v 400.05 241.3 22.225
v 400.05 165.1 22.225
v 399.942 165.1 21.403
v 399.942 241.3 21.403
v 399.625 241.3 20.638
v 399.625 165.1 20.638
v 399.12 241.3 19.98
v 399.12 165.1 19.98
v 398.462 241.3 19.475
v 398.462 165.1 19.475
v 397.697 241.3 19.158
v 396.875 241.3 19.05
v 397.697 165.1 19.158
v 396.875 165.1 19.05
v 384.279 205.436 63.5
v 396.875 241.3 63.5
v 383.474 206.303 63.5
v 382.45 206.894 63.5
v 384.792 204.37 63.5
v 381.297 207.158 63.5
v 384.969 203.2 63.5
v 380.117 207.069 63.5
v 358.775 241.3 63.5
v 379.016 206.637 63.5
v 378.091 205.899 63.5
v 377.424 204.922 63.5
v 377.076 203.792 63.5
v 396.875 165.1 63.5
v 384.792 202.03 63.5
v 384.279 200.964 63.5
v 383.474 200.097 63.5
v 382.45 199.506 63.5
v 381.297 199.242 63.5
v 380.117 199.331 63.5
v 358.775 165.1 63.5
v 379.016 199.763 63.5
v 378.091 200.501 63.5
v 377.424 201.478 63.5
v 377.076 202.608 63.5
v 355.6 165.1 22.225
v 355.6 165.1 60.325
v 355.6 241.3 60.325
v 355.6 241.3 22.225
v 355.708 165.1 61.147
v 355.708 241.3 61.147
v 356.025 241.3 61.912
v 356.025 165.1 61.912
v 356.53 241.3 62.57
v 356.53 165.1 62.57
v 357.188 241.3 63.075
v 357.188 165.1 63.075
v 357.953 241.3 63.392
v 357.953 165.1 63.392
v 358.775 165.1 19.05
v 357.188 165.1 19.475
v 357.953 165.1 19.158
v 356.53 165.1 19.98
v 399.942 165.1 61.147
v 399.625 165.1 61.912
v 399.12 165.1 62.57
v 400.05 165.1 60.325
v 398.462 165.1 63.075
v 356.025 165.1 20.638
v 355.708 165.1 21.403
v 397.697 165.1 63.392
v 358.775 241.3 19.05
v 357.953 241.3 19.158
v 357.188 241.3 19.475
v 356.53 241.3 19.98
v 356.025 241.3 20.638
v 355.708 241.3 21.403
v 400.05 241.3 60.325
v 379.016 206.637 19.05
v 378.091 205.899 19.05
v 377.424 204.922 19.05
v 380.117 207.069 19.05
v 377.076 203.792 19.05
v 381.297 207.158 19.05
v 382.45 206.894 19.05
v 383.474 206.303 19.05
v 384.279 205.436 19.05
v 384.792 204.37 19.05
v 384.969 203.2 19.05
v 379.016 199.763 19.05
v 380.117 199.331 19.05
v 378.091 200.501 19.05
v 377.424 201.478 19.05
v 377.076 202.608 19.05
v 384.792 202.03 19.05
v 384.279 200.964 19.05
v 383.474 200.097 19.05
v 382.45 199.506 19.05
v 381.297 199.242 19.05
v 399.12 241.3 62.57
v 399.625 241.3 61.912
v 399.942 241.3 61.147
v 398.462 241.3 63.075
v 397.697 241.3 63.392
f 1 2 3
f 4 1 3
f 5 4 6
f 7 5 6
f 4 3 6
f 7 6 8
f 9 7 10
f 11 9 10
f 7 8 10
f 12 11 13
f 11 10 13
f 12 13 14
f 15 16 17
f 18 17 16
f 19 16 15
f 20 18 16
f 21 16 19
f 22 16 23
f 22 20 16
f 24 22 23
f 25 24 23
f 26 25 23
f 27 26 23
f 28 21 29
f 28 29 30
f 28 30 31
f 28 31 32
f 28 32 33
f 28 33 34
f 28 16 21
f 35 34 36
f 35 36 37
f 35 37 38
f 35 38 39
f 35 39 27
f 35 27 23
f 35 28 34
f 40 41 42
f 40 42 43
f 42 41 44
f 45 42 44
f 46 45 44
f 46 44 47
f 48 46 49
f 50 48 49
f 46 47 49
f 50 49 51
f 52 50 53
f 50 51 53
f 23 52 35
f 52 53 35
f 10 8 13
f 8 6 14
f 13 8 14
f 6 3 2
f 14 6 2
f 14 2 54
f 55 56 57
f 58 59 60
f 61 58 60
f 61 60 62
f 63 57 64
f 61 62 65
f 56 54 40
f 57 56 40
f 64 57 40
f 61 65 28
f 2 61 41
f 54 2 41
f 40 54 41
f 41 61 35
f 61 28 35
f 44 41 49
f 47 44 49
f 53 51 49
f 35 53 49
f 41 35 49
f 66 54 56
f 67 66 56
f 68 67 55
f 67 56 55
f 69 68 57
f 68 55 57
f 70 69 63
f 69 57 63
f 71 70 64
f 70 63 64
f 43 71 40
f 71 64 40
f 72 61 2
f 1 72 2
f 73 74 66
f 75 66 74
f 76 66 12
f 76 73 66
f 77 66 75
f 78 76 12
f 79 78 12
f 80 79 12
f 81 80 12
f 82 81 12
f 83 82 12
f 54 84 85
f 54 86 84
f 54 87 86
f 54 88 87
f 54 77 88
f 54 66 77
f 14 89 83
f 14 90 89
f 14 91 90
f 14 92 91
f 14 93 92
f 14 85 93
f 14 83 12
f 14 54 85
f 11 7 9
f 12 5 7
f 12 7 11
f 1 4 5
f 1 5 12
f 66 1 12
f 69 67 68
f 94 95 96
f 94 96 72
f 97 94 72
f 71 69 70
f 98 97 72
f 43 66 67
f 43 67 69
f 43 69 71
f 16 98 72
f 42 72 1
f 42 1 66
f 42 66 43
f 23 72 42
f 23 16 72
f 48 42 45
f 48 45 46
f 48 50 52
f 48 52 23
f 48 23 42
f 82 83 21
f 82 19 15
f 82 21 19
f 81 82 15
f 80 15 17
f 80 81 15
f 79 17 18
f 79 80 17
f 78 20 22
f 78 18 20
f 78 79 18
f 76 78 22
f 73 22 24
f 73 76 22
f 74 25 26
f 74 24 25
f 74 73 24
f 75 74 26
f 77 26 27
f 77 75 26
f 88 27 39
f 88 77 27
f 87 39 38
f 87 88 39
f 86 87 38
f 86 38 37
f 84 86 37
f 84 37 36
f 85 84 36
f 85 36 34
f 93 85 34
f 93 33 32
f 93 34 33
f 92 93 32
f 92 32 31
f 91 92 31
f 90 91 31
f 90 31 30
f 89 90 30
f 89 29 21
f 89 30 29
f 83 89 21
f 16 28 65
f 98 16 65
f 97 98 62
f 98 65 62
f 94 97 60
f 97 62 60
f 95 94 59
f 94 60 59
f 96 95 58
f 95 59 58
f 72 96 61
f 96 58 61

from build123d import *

# Parameters (mm, degrees)
CYLINDER_R                 = 3.96875
CYLINDER_DEPTH             = 50.8
EXTRUDE017_DEPTH           = 76.2
EXTRUDE017_ROLL_ANGLE      = 90
EXTRUDE017_PLACEMENT_ANGLE = 180


with BuildPart() as cylinder:
    # Cylinder → Cylinder (new body)
    with BuildSketch(Plane(origin=(381, 203.2, 16.66875), x_dir=(1, 0, 0), z_dir=(0, 0, 1))):
        Circle(CYLINDER_R)
    extrude(amount=CYLINDER_DEPTH)


with BuildPart() as baffle_anchor_a:
    # Sketch017 → Extrude017 (new body)
    with BuildSketch(Plane.XY):
        with BuildLine():
            Line((0, 41.275), (0, 3.175))
            ThreePointArc((0, 3.175), (0.929936, 0.929936), (3.175, 0))
            Line((41.275, 0), (3.175, 0))
            ThreePointArc((41.275, 0), (43.520064, 0.929936), (44.45, 3.175))
            Line((44.45, 41.275), (44.45, 3.175))
            ThreePointArc((44.45, 41.275), (43.520064, 43.520064), (41.275, 44.45))
            Line((3.175, 44.45), (41.275, 44.45))
            ThreePointArc((3.175, 44.45), (0.929936, 43.520064), (0, 41.275))
        make_face()
    extrude(amount=EXTRUDE017_DEPTH)


with BuildPart() as baffle_anchor_a_1:
    # Extrude017 roll: moved
    add(baffle_anchor_a.part.rotate(Axis((0, 0, 0), (1, 0, 0)), EXTRUDE017_ROLL_ANGLE))


with BuildPart() as baffle_anchor_a_2:
    # Extrude017 placement: moved
    add(baffle_anchor_a_1.part.moved(Location((400.05, 165.1, 19.05))).rotate(Axis((400.05, 165.1, 19.05), (0, 0, 1)), EXTRUDE017_PLACEMENT_ANGLE))

    # Cut: cut Cylinder
    add(cylinder.part, mode=Mode.SUBTRACT)


solid = baffle_anchor_a_2.part
